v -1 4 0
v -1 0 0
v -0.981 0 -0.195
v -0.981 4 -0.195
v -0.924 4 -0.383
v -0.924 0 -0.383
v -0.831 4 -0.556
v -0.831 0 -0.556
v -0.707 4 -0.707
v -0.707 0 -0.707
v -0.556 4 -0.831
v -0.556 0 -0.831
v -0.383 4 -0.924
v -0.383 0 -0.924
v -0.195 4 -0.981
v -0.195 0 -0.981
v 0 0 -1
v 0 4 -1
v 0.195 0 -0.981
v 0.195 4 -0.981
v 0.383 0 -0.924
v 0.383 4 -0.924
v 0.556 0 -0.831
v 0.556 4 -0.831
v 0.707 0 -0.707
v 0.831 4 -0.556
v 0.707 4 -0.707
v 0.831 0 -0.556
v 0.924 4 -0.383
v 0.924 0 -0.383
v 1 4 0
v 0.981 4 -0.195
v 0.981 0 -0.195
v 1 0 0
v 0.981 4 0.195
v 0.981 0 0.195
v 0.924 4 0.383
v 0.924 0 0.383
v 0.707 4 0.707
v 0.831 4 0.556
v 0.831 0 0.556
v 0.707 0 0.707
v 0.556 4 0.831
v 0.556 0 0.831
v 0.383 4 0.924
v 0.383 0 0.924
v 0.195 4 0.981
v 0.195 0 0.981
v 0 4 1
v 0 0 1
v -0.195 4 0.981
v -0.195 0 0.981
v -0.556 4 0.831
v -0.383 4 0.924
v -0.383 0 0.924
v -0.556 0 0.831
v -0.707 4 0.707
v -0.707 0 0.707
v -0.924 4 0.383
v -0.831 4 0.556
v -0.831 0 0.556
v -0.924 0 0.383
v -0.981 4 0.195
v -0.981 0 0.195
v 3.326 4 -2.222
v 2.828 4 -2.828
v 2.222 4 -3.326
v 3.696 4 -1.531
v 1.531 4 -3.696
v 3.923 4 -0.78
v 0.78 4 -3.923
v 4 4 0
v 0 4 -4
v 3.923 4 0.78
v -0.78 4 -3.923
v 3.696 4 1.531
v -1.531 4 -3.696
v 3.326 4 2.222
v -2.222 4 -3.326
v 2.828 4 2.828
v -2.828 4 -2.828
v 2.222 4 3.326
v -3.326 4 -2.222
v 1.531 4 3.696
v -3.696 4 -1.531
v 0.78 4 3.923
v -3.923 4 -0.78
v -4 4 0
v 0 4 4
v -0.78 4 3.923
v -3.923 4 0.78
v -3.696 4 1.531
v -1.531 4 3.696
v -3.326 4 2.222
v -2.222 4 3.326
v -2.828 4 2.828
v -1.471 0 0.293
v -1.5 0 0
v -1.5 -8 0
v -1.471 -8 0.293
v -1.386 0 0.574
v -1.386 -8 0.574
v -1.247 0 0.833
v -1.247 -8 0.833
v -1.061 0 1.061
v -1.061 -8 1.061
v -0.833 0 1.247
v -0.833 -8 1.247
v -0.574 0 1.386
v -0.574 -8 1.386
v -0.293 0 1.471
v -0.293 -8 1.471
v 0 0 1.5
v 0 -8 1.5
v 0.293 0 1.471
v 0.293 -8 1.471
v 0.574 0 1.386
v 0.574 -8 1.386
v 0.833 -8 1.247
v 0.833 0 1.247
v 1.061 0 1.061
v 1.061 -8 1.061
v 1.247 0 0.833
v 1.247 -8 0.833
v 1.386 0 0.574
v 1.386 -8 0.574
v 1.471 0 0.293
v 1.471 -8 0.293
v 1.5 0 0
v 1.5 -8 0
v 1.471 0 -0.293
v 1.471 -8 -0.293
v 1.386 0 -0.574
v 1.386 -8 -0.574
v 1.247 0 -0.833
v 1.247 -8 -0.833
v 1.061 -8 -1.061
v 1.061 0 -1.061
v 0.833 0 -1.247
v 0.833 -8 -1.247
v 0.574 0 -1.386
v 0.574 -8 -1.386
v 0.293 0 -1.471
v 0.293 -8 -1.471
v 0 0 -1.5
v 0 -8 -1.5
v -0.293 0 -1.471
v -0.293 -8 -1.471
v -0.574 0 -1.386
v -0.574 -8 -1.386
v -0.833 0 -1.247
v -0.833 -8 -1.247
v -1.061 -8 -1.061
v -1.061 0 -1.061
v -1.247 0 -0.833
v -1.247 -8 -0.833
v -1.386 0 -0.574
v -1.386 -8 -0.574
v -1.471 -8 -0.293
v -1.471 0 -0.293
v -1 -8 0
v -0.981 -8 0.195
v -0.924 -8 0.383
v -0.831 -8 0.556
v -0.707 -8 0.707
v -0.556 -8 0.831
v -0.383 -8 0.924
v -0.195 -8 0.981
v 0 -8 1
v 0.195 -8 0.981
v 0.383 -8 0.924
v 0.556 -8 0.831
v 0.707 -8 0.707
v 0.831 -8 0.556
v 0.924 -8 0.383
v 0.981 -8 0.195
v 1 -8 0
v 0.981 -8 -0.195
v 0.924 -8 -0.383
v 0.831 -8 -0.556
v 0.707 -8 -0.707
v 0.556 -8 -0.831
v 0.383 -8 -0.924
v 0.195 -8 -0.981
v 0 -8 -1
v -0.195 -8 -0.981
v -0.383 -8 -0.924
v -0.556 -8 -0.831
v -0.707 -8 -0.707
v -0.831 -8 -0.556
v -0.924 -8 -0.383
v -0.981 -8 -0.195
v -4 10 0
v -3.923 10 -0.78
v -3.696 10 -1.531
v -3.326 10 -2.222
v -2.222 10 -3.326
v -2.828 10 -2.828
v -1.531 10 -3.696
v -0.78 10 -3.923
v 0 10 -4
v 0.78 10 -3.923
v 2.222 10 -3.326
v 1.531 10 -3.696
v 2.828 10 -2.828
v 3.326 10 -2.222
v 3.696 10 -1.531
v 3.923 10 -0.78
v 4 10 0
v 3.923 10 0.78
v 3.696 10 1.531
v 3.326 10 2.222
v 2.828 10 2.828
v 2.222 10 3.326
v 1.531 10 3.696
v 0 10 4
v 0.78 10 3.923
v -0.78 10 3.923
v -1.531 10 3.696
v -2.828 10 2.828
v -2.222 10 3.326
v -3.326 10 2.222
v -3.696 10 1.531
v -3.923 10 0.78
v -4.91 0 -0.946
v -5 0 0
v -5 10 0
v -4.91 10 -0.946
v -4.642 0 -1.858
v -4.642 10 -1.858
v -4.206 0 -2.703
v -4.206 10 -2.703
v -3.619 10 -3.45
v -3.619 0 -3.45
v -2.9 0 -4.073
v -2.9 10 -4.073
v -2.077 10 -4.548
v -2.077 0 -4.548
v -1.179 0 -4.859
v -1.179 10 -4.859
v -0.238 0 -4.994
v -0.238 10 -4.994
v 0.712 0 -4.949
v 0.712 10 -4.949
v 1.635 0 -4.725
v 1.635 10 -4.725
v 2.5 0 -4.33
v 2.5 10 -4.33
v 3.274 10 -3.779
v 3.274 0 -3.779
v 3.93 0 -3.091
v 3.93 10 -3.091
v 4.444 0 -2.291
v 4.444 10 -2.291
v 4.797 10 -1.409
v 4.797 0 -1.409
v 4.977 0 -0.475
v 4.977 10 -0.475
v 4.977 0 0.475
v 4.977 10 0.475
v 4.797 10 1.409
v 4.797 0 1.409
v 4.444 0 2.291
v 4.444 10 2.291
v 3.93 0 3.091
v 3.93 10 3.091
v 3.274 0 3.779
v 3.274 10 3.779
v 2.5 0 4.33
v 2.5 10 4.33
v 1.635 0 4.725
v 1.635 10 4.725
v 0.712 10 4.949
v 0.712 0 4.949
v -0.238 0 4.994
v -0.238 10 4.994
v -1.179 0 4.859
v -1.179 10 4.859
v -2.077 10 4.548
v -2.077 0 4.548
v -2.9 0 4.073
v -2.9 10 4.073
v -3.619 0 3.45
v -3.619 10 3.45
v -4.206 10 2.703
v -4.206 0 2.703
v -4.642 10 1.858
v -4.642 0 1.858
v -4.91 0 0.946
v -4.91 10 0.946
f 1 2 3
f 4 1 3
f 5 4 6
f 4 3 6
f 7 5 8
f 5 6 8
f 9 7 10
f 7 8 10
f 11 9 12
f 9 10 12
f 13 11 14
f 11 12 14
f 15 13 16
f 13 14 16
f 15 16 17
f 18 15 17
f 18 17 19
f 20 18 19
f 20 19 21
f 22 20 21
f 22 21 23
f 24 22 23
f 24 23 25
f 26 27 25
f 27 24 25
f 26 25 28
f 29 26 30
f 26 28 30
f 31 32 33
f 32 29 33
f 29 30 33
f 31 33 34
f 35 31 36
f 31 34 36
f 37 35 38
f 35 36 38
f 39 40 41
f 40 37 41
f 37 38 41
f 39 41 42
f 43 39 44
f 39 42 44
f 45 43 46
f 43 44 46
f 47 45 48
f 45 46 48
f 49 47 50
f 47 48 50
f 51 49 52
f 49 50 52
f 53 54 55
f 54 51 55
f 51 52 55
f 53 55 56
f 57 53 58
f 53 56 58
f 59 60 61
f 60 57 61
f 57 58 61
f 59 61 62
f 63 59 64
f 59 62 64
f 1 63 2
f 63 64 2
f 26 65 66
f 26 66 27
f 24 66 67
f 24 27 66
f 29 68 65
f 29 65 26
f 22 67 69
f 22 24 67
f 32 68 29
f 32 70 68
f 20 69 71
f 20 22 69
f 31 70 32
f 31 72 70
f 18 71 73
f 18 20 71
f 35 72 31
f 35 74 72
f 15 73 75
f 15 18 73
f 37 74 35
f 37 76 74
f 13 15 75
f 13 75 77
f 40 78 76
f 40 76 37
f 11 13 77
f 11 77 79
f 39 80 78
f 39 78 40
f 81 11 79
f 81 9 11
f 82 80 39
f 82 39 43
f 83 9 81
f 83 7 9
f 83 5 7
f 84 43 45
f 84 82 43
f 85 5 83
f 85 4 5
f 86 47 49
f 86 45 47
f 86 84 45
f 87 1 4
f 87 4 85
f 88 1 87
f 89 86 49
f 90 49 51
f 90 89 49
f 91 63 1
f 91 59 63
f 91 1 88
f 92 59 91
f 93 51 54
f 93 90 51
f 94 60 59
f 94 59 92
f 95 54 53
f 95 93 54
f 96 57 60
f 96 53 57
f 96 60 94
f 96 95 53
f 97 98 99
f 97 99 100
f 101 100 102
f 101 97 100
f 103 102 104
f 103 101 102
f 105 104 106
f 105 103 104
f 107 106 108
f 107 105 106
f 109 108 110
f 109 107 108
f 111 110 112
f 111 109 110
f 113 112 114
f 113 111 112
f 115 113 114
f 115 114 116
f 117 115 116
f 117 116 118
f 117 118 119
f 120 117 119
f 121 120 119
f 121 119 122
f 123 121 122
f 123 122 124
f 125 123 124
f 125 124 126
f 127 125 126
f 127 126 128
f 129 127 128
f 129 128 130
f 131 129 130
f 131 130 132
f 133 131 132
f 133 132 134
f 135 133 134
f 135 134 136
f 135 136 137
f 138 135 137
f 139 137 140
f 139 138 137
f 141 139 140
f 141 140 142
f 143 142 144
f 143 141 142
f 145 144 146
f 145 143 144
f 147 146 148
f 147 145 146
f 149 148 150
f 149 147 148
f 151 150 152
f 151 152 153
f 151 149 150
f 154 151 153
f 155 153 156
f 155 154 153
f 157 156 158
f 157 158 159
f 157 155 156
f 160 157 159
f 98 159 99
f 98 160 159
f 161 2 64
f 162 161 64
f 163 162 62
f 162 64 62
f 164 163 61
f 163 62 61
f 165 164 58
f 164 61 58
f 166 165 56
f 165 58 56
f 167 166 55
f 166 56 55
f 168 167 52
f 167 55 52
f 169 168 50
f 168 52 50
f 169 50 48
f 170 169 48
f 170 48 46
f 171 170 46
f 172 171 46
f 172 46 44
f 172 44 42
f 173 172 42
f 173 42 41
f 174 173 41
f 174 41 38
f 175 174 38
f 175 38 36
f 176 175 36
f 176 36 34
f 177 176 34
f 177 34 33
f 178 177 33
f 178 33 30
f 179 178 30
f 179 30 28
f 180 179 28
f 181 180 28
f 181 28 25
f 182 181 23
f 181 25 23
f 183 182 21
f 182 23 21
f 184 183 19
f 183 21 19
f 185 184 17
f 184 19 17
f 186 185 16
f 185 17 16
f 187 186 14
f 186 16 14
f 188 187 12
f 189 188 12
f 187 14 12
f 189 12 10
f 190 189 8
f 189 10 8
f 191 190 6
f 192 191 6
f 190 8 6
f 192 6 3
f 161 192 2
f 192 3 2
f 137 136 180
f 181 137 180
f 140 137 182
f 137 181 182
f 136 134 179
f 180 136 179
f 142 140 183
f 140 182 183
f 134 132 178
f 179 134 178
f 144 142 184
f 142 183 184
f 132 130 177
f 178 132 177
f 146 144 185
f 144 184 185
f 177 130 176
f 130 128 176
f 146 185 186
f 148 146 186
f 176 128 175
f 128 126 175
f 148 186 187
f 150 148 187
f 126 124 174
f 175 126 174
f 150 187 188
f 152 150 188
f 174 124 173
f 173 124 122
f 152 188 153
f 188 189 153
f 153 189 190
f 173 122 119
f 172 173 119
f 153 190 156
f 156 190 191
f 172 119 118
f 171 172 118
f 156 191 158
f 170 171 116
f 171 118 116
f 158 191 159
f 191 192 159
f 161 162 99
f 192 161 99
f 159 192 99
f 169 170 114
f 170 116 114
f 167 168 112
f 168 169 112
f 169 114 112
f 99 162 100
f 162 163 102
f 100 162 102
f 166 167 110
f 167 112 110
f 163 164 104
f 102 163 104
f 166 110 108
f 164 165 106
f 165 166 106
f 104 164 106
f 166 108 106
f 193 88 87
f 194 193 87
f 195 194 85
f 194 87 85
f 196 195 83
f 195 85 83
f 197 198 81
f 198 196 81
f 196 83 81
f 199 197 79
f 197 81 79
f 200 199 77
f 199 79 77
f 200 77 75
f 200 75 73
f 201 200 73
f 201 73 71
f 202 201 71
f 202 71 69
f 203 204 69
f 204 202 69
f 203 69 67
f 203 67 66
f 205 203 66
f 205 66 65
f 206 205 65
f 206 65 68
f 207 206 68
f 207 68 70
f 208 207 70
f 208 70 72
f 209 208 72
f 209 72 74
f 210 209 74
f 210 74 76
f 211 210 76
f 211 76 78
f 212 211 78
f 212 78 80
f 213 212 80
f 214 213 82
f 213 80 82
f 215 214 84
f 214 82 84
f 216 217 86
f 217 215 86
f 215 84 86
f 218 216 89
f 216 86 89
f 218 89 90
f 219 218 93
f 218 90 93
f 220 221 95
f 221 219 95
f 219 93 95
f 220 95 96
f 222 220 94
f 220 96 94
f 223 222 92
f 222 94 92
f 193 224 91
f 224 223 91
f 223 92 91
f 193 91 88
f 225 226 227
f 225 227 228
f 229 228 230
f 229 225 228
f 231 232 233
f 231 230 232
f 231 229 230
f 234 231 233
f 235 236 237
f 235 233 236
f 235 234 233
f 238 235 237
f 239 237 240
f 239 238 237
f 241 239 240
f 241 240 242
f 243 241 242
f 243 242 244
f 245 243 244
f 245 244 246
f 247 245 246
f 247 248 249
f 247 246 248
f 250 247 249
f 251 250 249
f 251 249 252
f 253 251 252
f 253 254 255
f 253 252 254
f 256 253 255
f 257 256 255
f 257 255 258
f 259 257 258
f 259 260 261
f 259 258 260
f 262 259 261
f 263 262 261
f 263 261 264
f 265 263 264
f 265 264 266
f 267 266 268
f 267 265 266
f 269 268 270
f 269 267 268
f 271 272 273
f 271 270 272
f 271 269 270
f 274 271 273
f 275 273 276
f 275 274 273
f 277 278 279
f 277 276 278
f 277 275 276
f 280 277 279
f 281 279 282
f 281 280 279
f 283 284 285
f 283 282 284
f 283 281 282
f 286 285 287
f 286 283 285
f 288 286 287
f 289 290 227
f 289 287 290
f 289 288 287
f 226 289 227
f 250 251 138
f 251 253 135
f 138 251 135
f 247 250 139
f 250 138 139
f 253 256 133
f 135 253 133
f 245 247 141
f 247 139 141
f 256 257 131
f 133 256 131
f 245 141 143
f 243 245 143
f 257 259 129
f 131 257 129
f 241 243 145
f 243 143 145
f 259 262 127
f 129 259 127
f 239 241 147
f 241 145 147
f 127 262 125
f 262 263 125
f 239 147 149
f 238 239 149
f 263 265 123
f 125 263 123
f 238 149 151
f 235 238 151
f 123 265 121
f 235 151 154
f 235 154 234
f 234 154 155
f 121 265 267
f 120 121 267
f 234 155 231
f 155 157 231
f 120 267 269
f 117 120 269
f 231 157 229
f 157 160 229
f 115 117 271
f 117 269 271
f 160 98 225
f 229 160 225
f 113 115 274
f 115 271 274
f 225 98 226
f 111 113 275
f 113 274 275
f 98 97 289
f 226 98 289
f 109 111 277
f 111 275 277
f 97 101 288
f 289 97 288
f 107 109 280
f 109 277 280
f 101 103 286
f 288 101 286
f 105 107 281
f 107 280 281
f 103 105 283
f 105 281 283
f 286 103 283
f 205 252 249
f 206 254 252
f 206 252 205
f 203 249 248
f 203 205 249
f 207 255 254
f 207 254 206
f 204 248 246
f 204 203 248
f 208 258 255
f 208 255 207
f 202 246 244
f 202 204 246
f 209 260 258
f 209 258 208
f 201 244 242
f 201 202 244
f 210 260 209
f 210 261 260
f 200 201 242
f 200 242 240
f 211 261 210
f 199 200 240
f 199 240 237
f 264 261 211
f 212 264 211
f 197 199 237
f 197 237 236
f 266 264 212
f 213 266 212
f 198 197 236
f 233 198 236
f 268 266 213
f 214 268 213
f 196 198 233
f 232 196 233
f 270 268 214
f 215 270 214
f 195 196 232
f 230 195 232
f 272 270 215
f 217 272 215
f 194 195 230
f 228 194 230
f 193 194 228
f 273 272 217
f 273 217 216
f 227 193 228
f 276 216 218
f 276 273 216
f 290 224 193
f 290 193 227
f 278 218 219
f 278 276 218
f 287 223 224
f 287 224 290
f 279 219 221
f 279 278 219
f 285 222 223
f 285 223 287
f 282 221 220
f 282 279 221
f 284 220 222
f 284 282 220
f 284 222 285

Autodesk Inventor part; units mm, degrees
ref_plane "YZ Plane" through (0, 0, 0) normal (1, 0, 0) x (0, 1, 0)
ref_plane "XZ Plane" through (0, 0, 0) normal (0, 1, 0) x (-1, 0, 0)
ref_plane "XY Plane" through (0, 0, 0) normal (0, 0, 1) x (1, 0, 0)
sketch "Sketch1" plane through (0, 0, 0) normal (0, 1, 0) x (-1, 0, 0)
  circle A0 centre (0, 0) radius 4
  circle A1 centre (0, 0) radius 5
  circle A2 centre (0, 0) radius 1
  circle A3 centre (0, 0) radius 1.5
  dimension "d0" = 8
  dimension "d1" = 10
  dimension "d2" = 2
  dimension "d3" = 3
extrude "Extrusion1" add sketch "Sketch1" along normal blind 10 contours A1
extrude "Extrusion2" add sketch "Sketch1" along normal blind 4 contours A0 | A3
extrude "Extrusion3" add sketch "Sketch1" against normal blind 8 contours A3
thread "Thread1" size "M8x1.25" class "6H" standard "ANSI Metric M Profile" length 10
